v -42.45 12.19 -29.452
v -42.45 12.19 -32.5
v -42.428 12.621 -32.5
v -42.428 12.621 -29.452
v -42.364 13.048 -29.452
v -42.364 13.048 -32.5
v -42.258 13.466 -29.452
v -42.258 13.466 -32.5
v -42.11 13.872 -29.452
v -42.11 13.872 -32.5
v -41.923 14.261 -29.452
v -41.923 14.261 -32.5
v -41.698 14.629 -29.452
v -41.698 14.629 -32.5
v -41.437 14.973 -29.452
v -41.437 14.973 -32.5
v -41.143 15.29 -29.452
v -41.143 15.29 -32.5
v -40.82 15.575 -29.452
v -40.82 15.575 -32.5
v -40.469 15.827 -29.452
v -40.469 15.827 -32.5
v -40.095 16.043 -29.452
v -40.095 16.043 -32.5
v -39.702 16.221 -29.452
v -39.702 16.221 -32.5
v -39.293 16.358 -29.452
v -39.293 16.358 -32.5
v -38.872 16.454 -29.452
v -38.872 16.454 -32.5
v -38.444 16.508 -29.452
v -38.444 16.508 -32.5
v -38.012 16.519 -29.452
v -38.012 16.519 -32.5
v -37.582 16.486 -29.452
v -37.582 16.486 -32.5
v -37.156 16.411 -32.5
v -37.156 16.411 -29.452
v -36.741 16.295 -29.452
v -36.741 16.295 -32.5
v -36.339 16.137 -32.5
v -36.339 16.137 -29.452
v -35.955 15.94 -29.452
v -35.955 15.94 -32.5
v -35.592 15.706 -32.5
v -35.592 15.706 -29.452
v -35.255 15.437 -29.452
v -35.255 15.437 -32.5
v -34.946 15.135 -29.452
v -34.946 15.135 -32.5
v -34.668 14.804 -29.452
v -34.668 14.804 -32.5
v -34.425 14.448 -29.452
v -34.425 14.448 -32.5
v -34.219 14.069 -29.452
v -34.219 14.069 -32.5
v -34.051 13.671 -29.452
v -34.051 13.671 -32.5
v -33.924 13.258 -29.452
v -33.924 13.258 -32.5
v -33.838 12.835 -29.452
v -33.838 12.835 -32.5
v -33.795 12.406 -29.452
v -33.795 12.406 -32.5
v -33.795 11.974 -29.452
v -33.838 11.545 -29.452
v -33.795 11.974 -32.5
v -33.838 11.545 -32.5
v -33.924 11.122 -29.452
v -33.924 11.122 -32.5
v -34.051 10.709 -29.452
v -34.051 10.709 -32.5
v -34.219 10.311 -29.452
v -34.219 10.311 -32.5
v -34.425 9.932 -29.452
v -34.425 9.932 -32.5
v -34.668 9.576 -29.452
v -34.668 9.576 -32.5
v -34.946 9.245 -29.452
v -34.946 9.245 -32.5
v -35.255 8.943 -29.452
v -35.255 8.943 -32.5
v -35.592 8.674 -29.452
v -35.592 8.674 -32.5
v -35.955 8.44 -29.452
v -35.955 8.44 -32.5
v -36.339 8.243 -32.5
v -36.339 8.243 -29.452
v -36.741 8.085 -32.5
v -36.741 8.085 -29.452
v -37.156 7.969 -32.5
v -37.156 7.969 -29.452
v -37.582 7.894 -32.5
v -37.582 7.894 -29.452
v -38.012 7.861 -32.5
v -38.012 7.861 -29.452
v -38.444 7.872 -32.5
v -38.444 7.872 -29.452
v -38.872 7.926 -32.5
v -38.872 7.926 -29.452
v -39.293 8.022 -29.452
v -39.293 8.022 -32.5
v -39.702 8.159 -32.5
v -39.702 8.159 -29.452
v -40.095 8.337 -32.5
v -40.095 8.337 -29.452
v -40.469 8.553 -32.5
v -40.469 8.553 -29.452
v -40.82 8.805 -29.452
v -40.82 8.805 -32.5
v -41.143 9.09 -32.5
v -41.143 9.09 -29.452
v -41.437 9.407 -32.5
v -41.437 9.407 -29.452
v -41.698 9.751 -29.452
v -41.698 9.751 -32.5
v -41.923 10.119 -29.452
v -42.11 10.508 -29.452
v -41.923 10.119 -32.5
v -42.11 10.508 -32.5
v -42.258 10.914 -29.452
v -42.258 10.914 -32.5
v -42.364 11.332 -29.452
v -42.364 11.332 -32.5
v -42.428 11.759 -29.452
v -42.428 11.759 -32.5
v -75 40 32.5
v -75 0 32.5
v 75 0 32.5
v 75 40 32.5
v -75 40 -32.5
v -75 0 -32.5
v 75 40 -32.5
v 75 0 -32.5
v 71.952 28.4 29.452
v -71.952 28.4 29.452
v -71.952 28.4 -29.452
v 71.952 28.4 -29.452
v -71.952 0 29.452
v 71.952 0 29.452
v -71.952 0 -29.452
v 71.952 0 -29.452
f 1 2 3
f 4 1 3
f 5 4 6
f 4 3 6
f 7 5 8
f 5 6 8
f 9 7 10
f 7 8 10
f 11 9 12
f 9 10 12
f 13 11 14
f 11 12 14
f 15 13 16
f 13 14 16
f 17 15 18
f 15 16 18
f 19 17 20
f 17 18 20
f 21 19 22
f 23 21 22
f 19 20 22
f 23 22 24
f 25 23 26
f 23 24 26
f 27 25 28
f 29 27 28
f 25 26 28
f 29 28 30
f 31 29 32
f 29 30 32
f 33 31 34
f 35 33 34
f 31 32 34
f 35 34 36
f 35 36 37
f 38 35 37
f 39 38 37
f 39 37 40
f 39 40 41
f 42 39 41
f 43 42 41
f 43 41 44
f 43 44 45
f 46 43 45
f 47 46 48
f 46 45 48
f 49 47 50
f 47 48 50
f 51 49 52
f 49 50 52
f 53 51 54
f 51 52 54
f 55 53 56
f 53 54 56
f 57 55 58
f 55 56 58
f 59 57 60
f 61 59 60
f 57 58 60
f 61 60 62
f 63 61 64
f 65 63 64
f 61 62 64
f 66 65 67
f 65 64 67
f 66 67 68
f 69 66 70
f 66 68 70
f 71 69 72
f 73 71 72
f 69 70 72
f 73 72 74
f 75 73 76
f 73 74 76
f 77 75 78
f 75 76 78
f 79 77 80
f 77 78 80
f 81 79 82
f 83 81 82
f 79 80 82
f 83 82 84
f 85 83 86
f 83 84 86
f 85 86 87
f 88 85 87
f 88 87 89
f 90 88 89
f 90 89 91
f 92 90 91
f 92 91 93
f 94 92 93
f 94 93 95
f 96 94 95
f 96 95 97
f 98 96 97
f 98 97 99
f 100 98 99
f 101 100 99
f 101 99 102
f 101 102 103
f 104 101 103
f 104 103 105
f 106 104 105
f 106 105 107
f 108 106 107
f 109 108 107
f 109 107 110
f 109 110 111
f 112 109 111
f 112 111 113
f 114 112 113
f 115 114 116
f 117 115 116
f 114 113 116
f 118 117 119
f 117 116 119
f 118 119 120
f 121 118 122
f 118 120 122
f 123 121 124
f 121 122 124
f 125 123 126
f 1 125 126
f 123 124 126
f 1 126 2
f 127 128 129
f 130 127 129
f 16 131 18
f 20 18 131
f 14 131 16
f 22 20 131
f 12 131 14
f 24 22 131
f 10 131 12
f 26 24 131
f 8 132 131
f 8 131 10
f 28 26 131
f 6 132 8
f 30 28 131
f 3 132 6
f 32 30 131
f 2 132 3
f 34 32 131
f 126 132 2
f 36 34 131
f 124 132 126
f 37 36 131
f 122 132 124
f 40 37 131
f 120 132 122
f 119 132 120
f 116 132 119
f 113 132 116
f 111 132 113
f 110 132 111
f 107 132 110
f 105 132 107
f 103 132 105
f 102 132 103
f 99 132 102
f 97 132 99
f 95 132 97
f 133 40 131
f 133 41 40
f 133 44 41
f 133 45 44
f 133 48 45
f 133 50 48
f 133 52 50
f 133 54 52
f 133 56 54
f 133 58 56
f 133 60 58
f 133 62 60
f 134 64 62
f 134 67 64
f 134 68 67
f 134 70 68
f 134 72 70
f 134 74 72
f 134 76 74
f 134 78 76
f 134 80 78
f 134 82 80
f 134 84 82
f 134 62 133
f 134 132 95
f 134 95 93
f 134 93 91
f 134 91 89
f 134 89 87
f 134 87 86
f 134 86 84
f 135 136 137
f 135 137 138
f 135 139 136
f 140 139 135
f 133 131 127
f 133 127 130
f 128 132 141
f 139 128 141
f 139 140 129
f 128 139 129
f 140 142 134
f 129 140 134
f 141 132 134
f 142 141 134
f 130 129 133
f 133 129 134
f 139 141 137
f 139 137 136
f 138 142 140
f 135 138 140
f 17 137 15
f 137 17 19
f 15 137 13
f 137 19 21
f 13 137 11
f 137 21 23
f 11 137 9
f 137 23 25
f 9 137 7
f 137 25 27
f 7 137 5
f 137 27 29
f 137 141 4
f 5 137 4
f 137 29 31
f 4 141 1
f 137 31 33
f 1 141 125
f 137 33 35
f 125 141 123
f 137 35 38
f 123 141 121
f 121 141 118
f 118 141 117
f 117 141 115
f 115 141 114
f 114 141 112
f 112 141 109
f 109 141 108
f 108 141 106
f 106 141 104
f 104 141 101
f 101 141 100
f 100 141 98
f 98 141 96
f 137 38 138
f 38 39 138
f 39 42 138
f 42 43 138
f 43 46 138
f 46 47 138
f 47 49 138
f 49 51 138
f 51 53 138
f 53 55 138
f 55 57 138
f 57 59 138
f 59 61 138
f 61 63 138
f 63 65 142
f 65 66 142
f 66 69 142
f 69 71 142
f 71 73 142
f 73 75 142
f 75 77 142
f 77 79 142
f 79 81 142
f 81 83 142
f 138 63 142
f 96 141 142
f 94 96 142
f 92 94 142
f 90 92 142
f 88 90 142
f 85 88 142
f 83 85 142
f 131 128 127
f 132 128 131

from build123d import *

# Parameters (mm, degrees)
SKETCH1_W           = 150
SKETCH1_H           = 65
BOSS_EXTRUDE1_DEPTH = 40
SKETCH2_W           = 143.904
SKETCH2_H           = 58.904
CUT_EXTRUDE1_DEPTH  = 28.4
SKETCH3_R           = 4.33
CUT_EXTRUDE2_DEPTH  = 3.048


with BuildPart() as part:
    # Sketch1 → Boss-Extrude1 (new body)
    with BuildSketch(Plane(origin=(0, 0, 0), x_dir=(1, 0, 0), z_dir=(0, 1, 0))):
        Rectangle(SKETCH1_W, SKETCH1_H)
    extrude(amount=BOSS_EXTRUDE1_DEPTH)

    # Sketch2 → Cut-Extrude1 (cut)
    with BuildSketch(Plane.XZ):
        Rectangle(SKETCH2_W, SKETCH2_H)
    extrude(amount=-CUT_EXTRUDE1_DEPTH, mode=Mode.SUBTRACT)

    # Sketch3 → Cut-Extrude2 (cut)
    with BuildSketch(Plane(origin=(0, 0, -32.5), x_dir=(-1, 0, 0), z_dir=(0, 0, -1))):
        with Locations((38.12, 12.19)):
            Circle(SKETCH3_R)
    extrude(amount=-CUT_EXTRUDE2_DEPTH, mode=Mode.SUBTRACT)


solid = part.part
